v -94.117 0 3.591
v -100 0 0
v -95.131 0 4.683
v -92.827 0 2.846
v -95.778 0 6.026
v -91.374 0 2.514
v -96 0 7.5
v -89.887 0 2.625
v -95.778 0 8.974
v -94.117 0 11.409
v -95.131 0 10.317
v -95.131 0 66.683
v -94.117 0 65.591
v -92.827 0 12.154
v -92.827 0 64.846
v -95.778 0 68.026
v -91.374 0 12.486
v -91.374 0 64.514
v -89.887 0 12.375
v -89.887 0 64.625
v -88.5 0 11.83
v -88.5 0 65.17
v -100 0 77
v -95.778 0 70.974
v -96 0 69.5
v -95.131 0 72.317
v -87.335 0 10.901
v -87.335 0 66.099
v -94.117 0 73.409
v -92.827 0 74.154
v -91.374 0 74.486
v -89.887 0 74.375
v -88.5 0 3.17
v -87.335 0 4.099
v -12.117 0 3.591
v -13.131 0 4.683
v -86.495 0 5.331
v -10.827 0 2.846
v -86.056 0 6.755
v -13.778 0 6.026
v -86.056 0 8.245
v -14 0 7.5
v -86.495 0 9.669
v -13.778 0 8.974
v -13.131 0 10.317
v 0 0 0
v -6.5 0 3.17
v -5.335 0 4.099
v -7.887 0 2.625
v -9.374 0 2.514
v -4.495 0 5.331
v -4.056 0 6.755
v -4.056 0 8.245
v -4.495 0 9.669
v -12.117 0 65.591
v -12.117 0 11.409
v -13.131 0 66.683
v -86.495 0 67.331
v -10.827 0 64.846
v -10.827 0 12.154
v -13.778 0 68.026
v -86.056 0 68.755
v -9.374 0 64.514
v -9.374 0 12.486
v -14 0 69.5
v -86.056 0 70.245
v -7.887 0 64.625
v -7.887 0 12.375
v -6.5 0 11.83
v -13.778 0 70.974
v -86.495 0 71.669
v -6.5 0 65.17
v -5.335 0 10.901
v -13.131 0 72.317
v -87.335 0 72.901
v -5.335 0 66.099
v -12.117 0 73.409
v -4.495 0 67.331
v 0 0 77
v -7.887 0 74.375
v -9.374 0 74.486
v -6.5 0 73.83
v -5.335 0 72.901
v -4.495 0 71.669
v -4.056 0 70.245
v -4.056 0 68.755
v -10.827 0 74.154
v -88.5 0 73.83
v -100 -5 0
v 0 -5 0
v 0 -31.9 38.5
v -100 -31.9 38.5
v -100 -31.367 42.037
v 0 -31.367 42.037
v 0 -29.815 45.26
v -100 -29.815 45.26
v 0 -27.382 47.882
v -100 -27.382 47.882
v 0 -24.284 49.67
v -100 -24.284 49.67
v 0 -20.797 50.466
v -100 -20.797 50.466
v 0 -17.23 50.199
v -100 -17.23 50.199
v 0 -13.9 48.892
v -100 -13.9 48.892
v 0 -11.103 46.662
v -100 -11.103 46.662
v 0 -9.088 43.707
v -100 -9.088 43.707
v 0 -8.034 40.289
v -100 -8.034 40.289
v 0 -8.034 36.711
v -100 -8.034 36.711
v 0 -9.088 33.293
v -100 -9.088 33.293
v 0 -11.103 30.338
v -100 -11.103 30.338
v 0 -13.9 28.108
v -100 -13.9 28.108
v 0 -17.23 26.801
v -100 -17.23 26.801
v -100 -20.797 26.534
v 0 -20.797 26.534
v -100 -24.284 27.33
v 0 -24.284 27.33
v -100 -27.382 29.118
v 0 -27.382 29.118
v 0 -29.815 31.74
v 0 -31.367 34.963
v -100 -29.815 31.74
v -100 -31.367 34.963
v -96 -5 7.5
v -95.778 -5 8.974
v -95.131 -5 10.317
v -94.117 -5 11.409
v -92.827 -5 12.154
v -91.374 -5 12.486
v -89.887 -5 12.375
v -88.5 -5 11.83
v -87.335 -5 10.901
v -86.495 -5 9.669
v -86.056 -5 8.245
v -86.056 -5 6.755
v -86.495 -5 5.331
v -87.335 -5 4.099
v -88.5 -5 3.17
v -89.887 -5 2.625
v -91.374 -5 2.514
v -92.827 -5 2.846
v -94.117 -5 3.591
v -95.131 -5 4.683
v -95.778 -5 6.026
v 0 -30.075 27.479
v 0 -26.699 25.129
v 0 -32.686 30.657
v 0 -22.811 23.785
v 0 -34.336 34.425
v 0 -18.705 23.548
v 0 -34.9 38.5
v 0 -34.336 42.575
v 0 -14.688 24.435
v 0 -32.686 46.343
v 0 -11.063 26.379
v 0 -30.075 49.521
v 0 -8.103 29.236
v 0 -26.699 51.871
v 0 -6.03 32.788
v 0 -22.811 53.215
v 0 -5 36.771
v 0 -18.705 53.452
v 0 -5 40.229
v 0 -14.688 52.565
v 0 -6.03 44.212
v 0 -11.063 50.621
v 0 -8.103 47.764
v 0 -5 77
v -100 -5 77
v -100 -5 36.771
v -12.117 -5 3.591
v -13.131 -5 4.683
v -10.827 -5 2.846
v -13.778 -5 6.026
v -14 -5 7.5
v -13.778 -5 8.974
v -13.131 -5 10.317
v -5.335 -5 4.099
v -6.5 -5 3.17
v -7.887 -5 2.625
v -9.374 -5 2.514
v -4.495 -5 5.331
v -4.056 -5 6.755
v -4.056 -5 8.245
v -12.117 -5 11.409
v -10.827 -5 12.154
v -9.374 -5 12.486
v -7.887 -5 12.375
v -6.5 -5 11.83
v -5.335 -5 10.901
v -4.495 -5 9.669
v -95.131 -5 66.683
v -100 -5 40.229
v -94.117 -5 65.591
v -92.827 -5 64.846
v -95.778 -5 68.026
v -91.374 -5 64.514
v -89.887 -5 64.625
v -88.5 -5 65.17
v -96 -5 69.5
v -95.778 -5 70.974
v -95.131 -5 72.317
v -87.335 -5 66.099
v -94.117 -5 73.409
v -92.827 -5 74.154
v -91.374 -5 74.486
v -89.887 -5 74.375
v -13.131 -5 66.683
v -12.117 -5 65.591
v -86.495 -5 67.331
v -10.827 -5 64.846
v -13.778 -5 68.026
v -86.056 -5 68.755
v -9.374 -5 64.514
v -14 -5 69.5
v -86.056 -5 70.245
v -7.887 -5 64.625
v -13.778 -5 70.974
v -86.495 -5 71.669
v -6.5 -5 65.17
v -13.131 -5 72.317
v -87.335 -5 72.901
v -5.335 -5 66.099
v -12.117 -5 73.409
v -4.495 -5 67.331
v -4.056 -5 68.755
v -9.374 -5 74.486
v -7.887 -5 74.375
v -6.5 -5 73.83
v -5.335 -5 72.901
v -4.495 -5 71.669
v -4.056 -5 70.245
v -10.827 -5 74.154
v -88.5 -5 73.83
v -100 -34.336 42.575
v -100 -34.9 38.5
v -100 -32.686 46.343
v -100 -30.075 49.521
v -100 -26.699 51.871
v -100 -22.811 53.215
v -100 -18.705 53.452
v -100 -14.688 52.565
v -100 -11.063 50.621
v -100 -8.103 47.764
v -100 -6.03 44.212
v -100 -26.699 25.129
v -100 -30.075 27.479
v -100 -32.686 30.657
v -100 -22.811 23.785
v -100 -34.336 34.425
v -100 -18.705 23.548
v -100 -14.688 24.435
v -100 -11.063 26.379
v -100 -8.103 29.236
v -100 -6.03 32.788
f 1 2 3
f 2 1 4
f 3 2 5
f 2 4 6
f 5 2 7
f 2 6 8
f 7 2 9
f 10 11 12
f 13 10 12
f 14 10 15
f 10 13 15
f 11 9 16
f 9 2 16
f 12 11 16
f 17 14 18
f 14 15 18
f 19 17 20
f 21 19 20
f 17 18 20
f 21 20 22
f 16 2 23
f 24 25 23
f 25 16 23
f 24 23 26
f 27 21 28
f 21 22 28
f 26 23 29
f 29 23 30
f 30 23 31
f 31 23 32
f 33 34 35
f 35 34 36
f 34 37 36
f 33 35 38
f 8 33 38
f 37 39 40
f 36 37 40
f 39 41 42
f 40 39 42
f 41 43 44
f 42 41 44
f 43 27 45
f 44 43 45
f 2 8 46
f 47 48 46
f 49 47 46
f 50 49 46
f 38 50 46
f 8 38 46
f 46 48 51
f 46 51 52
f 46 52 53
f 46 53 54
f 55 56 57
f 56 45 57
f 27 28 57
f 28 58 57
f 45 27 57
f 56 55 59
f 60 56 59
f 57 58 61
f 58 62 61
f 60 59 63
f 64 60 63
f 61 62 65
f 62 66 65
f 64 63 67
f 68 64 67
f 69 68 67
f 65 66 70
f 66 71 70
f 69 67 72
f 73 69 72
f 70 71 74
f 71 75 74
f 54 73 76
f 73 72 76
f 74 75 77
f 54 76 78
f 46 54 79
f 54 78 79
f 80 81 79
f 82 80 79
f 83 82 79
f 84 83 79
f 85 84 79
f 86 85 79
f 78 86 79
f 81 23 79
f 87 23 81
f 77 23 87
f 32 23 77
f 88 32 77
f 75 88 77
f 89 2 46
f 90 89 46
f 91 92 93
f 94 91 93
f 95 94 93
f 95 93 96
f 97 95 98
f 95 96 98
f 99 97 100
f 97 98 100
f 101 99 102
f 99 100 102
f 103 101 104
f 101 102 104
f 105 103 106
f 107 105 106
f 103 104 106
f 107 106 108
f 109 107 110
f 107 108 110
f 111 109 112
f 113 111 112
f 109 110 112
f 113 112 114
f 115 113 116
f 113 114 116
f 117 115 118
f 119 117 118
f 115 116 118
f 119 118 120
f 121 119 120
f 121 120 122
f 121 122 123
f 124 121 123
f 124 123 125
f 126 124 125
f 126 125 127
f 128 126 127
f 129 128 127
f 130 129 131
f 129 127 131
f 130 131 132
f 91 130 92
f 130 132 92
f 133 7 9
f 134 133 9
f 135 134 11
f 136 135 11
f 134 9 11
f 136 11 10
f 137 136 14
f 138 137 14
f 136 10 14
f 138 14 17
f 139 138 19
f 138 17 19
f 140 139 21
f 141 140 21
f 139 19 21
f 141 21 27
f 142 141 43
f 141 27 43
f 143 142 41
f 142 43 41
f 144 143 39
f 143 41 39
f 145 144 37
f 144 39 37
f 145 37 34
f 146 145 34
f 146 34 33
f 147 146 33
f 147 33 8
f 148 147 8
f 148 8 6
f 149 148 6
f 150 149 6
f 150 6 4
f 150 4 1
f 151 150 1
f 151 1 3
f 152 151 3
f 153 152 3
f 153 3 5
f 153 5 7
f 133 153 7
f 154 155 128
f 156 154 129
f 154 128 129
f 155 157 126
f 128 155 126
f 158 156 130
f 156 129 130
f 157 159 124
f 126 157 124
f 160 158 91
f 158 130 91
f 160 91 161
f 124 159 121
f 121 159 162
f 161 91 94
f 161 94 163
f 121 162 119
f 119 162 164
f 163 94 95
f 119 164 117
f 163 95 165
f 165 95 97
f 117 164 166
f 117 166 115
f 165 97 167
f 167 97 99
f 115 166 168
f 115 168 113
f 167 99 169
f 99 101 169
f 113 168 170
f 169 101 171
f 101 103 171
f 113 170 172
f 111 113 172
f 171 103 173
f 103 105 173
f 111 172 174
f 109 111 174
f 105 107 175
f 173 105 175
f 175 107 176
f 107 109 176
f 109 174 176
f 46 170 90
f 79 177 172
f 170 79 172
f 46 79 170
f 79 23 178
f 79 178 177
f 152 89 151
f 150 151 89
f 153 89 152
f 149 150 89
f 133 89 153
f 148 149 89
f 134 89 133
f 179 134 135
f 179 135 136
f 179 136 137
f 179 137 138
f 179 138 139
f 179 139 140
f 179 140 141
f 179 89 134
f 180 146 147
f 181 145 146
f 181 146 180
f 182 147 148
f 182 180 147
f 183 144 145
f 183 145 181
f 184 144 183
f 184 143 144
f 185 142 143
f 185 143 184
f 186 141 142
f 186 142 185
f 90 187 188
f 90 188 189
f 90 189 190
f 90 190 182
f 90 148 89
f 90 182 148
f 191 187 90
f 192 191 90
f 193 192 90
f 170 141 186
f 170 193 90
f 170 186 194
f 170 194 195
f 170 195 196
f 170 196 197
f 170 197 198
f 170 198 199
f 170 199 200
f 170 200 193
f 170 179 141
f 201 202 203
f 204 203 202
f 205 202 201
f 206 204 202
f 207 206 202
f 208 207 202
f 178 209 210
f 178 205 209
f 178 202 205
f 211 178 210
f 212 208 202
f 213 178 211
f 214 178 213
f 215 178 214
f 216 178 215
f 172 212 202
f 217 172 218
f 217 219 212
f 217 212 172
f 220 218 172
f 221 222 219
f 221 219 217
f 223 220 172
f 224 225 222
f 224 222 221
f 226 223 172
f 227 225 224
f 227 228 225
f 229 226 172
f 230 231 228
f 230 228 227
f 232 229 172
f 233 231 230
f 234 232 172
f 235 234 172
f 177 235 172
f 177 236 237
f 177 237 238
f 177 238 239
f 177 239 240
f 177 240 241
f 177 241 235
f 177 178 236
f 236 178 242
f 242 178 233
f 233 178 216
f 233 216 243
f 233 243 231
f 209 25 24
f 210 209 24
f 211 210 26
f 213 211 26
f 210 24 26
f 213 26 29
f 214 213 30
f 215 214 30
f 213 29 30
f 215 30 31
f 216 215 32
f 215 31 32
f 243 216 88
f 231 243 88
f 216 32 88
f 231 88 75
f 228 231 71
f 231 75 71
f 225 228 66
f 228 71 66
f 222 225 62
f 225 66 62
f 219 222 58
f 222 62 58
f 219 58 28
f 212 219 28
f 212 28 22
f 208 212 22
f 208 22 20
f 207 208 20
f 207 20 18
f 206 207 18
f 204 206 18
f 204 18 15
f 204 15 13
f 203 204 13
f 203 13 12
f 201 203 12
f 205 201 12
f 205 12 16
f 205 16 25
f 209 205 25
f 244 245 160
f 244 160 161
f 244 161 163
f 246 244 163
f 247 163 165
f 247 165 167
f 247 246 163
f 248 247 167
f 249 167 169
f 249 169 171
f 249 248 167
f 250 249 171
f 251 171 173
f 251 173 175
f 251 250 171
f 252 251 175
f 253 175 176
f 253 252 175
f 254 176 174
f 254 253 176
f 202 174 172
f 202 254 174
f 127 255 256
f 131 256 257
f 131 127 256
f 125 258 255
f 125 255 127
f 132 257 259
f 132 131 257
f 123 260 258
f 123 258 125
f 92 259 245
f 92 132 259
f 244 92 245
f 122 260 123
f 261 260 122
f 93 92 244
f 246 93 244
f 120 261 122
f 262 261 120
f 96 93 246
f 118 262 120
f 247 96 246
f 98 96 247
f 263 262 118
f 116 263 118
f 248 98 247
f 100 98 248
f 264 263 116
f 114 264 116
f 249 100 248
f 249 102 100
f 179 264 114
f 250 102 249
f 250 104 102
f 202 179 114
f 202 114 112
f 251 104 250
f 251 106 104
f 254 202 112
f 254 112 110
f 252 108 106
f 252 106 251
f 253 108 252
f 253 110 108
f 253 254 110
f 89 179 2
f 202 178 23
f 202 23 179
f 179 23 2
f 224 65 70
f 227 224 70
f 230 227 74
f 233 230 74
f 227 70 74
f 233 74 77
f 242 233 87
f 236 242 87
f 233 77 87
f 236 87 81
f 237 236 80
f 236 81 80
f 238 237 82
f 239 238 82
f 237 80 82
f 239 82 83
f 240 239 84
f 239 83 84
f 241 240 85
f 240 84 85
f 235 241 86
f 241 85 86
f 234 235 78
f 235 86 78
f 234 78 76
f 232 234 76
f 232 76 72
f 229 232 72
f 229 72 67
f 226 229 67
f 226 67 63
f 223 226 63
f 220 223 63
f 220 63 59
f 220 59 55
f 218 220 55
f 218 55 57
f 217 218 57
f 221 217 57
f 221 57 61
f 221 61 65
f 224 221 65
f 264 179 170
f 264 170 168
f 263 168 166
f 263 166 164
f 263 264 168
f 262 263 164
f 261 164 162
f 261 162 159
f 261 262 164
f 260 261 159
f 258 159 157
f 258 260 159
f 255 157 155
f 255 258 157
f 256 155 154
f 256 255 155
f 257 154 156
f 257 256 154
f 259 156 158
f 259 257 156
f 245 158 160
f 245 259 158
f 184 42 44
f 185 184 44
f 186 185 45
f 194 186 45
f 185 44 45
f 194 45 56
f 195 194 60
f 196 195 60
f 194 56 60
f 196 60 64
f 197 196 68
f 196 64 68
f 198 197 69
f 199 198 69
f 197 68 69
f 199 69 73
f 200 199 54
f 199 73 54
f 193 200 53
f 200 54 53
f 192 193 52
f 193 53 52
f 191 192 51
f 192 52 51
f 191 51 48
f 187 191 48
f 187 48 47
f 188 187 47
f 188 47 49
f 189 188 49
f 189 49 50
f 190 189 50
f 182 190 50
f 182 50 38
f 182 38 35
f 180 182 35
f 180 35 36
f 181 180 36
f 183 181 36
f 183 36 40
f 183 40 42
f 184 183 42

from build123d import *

# Parameters (mm, degrees)
F0_W     = 100
F0_H     = 77
F1_DEPTH = 5
F3_D     = 10
F4_R     = 12
F5_DEPTH = 100


with BuildPart() as f1:
    # F0 (on Front) → F1 (new body)
    with BuildSketch(Plane.XZ):
        with Locations((-50, 38.5)):
            Rectangle(F0_W, F0_H)
    extrude(amount=F1_DEPTH)

    # F3 (through all)
    with Locations(Plane.XZ.offset(5)):
        with Locations((-91, 69.5), (-9, 69.5), (-91, 7.5), (-9, 7.5)):
            Hole(F3_D / 2)

    # F4 (on face) → F5 (join, through all)
    with BuildSketch(Plane(origin=(-100, 0, 0), x_dir=(0, -1, 0), z_dir=(-1, 0, 0))):
        with BuildLine():
            ThreePointArc((5, 36.770838), (20.766025, 23.525021), (34.9, 38.5))
            ThreePointArc((34.9, 38.5), (20.766025, 53.474979), (5, 40.229162))
            Line((5, 40.229162), (5, 36.770838))
        make_face()
        with Locations((19.9, 38.5)):
            Circle(F4_R, mode=Mode.SUBTRACT)
    extrude(amount=-F5_DEPTH)


solid = f1.part
